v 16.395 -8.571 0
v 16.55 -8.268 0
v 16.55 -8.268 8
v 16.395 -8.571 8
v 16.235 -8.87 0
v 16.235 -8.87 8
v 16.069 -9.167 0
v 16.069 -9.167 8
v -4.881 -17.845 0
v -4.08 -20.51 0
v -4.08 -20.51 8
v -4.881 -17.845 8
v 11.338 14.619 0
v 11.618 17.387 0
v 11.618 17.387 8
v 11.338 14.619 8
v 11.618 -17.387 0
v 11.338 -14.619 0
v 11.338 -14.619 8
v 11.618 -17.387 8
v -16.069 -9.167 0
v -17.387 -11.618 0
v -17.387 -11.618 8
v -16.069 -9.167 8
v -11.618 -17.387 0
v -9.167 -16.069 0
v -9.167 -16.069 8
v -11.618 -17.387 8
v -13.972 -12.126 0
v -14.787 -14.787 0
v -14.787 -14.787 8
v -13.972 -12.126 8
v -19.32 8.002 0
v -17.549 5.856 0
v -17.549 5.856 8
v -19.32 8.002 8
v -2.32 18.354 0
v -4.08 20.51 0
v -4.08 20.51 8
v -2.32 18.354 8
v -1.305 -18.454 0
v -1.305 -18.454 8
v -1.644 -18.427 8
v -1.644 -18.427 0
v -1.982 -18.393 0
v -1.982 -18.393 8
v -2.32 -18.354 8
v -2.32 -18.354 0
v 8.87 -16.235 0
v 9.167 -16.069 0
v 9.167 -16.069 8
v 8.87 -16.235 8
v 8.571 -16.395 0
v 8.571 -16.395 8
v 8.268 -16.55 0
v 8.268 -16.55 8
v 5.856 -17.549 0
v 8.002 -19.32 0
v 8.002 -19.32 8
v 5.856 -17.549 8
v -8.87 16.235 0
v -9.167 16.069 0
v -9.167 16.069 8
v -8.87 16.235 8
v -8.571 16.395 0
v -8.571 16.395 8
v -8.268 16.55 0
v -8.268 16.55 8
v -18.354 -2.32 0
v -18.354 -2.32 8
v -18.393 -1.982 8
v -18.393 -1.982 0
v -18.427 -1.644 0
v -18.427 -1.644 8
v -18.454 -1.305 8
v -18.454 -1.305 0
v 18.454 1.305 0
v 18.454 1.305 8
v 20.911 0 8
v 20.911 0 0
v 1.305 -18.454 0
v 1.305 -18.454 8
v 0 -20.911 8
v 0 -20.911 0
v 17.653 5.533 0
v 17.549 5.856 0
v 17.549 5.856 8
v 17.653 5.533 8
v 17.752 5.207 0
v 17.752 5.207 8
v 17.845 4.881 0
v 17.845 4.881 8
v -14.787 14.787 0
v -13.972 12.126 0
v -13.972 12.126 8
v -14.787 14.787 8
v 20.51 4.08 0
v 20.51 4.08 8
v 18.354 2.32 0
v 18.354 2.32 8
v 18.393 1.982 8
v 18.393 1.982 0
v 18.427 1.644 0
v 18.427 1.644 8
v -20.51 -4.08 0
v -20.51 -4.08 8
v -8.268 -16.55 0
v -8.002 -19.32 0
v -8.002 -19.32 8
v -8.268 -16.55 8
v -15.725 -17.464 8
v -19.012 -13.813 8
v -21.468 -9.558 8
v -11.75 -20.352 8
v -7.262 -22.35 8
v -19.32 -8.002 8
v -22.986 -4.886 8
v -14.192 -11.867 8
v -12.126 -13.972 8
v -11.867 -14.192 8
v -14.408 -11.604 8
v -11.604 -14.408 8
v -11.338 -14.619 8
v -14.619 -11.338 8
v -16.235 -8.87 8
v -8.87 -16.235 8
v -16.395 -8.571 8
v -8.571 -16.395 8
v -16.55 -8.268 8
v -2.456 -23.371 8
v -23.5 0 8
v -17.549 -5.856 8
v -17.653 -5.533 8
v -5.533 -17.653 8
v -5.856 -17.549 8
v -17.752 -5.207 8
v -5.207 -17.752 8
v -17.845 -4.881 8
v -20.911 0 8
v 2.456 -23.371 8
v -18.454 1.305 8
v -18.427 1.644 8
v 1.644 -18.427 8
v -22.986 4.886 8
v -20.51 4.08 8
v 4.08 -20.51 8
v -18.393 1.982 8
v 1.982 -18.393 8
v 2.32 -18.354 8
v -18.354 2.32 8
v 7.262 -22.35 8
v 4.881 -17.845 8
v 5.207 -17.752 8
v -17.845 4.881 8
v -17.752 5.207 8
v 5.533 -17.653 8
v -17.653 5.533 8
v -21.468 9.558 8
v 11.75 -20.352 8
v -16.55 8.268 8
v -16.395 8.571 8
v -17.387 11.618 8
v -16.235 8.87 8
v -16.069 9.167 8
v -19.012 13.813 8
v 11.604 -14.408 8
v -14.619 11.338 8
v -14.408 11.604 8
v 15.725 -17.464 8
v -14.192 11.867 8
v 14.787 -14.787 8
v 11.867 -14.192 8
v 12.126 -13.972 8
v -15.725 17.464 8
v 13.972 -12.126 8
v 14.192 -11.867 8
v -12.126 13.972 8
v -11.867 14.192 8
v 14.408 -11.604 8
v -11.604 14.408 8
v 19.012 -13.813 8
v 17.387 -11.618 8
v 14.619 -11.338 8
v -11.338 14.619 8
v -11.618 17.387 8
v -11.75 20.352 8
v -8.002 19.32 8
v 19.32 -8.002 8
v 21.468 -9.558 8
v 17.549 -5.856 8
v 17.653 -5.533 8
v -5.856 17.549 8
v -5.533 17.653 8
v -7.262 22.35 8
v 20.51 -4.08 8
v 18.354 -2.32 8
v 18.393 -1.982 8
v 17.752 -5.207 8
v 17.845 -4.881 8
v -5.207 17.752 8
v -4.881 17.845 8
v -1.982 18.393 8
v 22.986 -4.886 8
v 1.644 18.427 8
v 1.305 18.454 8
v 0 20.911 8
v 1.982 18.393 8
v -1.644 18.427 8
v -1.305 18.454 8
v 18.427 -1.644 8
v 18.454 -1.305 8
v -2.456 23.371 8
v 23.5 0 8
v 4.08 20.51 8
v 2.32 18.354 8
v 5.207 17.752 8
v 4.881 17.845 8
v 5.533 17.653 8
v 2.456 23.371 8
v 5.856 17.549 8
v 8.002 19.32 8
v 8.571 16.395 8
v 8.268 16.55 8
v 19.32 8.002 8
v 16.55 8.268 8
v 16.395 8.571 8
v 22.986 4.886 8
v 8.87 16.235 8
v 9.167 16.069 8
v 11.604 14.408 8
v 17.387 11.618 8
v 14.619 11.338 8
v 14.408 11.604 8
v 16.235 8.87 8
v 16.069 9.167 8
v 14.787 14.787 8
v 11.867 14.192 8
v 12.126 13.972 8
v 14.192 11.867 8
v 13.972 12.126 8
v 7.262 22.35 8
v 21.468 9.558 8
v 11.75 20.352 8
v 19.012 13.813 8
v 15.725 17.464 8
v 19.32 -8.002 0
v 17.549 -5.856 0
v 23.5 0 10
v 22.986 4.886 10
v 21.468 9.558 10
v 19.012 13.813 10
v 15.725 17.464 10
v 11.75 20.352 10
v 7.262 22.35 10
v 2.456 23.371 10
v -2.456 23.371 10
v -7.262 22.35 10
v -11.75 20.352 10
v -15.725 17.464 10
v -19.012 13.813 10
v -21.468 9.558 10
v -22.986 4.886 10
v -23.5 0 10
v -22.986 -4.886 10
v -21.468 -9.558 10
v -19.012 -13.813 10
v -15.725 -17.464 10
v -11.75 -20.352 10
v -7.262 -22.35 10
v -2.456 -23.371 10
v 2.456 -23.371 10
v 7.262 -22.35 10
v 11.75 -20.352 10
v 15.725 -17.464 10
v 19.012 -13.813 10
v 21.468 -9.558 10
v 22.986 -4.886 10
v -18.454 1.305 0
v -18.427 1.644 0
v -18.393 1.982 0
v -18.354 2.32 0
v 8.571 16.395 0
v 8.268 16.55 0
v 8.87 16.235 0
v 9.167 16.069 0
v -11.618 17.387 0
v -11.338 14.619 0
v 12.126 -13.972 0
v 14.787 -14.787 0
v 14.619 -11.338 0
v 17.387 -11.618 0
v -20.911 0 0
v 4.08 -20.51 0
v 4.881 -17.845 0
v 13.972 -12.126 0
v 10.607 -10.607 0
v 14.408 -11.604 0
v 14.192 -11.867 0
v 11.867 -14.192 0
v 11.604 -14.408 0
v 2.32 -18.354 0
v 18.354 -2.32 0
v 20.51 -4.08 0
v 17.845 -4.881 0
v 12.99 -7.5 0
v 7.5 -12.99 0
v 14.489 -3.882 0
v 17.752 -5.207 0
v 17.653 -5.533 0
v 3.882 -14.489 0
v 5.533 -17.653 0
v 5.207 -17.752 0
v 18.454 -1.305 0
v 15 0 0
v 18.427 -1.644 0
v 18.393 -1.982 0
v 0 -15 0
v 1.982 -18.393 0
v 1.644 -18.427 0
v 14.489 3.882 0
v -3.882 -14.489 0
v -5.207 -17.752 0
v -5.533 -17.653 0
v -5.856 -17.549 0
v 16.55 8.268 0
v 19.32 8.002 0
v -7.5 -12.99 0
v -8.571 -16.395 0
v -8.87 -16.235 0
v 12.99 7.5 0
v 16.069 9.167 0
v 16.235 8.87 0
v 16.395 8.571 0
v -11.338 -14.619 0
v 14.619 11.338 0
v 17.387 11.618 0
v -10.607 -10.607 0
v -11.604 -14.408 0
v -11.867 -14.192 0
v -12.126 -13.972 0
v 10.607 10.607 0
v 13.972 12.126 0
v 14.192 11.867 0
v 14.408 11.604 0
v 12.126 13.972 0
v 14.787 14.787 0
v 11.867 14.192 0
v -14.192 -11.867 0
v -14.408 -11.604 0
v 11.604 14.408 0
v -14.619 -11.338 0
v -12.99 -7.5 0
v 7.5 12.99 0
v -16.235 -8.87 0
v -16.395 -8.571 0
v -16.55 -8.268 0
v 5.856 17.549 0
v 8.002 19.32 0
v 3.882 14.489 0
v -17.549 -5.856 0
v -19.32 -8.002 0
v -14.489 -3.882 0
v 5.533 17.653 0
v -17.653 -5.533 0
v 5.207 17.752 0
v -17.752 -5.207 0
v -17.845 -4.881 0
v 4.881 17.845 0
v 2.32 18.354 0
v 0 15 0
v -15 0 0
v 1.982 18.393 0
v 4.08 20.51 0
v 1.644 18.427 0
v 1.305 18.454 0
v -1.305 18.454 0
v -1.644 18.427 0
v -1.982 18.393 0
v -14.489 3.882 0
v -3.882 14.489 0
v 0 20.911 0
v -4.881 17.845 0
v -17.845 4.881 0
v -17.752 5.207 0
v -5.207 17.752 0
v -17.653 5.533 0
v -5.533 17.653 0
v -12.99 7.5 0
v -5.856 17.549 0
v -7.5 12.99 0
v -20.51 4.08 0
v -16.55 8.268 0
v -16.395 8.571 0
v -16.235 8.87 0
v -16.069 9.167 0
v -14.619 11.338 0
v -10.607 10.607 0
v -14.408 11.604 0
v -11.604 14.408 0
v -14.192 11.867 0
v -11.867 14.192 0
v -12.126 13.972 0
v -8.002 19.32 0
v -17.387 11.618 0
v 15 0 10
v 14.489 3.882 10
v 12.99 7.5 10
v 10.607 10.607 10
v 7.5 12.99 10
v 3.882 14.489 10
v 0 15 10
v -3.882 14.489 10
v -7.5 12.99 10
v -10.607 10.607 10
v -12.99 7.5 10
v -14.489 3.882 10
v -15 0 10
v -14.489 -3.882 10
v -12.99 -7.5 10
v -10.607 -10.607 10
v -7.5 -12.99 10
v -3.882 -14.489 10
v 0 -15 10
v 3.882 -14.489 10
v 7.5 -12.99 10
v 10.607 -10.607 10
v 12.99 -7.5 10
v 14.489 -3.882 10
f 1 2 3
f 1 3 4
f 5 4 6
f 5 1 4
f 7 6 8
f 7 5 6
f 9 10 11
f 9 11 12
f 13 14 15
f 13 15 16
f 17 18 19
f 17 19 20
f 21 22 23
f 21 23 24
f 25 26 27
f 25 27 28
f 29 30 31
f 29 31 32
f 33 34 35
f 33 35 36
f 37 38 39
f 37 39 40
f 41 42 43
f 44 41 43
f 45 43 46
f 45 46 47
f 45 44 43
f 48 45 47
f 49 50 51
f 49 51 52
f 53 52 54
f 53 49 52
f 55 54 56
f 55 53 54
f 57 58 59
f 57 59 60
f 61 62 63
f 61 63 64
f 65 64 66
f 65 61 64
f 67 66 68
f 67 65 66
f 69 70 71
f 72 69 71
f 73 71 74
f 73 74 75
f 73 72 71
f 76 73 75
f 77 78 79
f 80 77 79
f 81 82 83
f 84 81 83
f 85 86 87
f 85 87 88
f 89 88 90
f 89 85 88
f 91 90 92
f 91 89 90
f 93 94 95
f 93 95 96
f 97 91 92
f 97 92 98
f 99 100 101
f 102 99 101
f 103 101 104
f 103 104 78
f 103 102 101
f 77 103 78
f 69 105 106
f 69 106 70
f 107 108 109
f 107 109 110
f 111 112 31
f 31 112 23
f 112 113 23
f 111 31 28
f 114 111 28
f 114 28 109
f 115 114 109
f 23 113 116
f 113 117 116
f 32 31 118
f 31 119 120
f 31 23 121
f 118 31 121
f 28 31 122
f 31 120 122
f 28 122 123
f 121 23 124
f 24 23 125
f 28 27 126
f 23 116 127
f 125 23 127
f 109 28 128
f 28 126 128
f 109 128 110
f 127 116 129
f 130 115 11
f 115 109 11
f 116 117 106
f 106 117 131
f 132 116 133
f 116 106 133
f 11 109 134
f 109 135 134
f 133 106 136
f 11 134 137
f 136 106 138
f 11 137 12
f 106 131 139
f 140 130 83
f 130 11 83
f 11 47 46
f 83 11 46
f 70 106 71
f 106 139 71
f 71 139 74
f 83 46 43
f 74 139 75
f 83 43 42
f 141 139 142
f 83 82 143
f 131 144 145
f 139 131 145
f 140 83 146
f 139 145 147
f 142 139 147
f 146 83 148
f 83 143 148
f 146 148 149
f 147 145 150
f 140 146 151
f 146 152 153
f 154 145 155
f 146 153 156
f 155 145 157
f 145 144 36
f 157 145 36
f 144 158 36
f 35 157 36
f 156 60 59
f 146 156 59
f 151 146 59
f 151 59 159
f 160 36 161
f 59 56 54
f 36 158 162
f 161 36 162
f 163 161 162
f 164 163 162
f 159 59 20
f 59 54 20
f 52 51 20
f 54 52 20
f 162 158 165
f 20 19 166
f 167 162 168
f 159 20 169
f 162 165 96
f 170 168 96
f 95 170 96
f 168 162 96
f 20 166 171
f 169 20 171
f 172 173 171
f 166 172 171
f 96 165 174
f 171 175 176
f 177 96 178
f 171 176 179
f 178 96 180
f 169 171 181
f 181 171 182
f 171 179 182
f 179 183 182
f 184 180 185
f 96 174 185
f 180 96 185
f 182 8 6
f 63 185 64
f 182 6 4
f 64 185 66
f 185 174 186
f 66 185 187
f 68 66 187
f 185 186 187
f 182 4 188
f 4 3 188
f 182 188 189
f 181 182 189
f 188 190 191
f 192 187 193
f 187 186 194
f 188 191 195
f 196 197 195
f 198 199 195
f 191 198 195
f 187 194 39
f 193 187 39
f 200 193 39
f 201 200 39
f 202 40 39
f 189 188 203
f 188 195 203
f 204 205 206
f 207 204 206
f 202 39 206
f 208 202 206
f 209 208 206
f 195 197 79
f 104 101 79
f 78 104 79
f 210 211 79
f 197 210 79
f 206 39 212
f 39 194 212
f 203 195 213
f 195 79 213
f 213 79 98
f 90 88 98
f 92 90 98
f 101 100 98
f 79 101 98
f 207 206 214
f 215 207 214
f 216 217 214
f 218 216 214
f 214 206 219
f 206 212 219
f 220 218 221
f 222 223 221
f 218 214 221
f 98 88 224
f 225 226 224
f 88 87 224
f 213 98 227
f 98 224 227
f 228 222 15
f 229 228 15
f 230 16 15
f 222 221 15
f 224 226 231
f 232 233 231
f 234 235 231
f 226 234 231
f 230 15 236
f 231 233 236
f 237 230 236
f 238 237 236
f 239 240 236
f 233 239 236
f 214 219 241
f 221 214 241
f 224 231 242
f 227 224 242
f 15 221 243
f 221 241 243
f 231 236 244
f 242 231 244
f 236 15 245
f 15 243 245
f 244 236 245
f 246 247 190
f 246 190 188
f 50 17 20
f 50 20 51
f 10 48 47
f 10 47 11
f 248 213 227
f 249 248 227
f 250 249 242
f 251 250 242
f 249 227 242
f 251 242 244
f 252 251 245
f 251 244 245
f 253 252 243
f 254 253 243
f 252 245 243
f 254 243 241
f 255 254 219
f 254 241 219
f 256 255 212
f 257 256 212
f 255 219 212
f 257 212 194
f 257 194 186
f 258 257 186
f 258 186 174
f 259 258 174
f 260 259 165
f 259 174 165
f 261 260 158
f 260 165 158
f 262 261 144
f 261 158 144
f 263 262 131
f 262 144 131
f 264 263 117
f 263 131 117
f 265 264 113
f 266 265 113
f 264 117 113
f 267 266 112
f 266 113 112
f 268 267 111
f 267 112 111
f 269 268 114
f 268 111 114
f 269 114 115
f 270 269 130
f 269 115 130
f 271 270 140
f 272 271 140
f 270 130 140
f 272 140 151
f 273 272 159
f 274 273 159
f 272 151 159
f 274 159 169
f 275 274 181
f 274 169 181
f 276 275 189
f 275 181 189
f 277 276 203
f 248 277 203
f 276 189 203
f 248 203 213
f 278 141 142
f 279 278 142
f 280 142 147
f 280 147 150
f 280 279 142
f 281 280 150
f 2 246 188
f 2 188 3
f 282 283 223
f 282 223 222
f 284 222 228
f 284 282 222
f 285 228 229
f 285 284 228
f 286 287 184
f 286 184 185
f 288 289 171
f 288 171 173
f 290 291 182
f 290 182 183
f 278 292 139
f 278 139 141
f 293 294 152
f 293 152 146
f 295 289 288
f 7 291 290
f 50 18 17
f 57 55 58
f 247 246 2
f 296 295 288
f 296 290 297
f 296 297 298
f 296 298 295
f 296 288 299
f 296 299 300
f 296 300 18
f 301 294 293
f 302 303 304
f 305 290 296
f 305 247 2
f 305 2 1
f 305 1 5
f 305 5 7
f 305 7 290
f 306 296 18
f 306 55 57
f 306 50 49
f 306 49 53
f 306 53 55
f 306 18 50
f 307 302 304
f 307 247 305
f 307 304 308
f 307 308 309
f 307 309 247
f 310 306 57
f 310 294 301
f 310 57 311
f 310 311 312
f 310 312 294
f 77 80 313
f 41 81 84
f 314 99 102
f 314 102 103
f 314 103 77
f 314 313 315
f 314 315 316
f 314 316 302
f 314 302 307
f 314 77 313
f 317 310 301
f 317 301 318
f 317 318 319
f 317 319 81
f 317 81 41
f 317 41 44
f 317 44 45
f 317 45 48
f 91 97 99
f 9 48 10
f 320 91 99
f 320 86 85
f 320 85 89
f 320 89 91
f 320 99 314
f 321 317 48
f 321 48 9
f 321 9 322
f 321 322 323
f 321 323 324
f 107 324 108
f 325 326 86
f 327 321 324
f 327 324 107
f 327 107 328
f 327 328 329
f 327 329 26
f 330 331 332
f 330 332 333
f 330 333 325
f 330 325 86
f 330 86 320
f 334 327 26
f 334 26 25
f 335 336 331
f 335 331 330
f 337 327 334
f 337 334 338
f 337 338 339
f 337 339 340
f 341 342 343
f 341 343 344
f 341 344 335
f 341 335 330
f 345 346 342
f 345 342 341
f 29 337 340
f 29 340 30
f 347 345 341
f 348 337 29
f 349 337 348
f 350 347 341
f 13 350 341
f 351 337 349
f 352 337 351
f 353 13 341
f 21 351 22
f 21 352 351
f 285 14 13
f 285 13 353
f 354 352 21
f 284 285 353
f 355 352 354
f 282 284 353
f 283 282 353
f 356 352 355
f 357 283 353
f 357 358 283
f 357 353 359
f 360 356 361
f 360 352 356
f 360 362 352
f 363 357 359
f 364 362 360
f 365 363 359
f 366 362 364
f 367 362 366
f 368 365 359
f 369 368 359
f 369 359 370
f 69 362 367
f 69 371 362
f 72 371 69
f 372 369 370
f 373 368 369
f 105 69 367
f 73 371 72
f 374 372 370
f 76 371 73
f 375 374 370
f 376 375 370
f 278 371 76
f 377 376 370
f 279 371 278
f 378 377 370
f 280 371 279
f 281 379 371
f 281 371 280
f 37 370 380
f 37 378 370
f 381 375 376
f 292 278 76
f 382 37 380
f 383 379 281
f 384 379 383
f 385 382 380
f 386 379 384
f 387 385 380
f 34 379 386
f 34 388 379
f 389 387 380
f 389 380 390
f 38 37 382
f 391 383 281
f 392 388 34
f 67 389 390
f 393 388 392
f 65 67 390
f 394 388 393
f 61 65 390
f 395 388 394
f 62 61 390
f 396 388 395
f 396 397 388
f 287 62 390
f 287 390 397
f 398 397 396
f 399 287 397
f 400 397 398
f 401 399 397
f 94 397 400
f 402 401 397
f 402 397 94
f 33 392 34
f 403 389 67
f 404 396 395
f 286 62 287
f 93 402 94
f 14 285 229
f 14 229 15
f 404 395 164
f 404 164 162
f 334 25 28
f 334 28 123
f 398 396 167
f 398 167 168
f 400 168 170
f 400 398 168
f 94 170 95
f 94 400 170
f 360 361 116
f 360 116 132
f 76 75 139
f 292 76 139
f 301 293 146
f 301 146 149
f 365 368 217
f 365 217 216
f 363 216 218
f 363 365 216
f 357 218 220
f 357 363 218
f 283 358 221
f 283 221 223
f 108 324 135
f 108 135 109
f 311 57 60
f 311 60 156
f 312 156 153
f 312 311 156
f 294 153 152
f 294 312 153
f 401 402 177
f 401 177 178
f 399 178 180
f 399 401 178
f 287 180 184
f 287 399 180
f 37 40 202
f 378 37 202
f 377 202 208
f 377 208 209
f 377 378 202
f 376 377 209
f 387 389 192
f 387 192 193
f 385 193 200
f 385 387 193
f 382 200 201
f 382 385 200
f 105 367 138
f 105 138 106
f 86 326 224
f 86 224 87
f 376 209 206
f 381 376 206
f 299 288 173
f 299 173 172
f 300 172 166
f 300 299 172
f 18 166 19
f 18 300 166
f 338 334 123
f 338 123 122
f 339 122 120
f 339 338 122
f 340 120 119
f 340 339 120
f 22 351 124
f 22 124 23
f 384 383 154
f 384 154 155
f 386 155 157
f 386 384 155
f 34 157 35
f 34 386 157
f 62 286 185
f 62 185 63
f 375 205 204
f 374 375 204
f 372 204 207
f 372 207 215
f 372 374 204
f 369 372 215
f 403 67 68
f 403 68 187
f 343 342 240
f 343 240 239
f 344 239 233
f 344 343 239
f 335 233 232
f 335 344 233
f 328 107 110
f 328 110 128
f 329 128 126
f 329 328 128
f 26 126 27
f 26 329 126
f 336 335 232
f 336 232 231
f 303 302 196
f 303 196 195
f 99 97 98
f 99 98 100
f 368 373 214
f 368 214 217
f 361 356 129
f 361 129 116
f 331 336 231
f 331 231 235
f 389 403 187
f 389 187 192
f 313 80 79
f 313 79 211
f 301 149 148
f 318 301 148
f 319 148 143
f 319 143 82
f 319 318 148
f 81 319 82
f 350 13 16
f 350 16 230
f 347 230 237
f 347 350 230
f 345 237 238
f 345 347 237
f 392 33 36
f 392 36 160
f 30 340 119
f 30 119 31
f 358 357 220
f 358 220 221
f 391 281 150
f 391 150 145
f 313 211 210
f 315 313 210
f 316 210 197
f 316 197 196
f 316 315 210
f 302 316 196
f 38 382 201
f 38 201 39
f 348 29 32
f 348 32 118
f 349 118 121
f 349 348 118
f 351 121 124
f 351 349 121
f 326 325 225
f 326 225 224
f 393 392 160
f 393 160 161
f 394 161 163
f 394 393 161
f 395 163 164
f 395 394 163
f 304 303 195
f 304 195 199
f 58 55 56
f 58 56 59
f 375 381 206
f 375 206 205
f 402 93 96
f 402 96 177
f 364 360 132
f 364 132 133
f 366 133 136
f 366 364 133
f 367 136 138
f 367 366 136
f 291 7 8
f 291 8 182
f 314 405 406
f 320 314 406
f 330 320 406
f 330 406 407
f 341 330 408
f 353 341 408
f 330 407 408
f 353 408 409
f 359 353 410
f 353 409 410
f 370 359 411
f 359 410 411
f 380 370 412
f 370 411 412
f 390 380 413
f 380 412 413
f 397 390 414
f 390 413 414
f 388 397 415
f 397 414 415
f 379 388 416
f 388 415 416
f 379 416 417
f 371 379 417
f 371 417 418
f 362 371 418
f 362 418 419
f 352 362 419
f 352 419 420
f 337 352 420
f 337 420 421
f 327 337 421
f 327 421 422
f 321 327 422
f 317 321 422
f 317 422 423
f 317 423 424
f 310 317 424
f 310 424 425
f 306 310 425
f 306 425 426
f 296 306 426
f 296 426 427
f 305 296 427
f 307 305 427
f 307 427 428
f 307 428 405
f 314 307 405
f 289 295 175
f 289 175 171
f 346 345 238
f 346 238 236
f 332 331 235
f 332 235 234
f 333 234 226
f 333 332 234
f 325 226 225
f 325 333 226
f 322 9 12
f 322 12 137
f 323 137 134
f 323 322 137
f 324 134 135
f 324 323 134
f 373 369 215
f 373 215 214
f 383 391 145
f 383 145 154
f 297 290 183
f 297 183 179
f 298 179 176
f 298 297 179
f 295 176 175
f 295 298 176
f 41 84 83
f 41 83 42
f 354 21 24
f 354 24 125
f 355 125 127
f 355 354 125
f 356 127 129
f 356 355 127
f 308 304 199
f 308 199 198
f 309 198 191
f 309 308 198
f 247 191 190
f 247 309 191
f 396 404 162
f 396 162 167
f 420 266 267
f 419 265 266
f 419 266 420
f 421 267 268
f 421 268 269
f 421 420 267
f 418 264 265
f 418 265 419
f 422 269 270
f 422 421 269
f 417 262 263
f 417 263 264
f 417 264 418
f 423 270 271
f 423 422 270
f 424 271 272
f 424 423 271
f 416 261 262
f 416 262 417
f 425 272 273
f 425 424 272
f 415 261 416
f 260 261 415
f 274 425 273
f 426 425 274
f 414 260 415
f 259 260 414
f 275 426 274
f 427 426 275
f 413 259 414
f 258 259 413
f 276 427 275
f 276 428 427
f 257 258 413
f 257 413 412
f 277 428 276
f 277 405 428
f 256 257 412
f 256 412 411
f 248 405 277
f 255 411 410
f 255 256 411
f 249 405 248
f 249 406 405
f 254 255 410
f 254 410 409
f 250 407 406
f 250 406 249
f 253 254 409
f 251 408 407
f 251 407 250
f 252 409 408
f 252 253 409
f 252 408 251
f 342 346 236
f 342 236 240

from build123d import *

# Parameters (mm, degrees)
BOSS_EXTRUDE1_DEPTH = 8
SKETCH3_R           = 23.5
BOSS_EXTRUDE2_DEPTH = 2
SKETCH5_R           = 15
CUT_EXTRUDE2_DEPTH  = 12


with BuildPart() as part:
    # Sketch1 → Boss-Extrude1 (new body)
    with BuildSketch(Plane.XY):
        with BuildLine():
            Line((0, 20.911393532), (1.305419533, 18.453885223))
            ThreePointArc((1.305419533, 18.453885223), (1.813317096, 18.410917443), (2.319838147, 18.353973711))
            Line((2.319838147, 18.353973711), (4.079610498, 20.509586969))
            Line((4.079610498, 20.509586969), (4.880510674, 17.844624276))
            ThreePointArc((4.880510674, 17.844624276), (5.370266529, 17.703396211), (5.855945749, 17.548729281))
            Line((5.855945749, 17.548729281), (8.002443852, 19.319608481))
            Line((8.002443852, 19.319608481), (8.268046526, 16.549604426))
            ThreePointArc((8.268046526, 16.549604426), (8.720839631, 16.31554339), (9.16701264, 16.069097027))
            Line((9.16701264, 16.069097027), (11.617747778, 17.387188273))
            Line((11.617747778, 17.387188273), (11.337845987, 14.618592558))
            ThreePointArc((11.337845987, 14.618592558), (11.736275757, 14.300693387), (12.125796376, 13.971938385))
            Line((12.125796376, 13.971938385), (14.786588171, 14.786588171))
            Line((14.786588171, 14.786588171), (13.971938385, 12.125796376))
            ThreePointArc((13.971938385, 12.125796376), (14.300693387, 11.736275757), (14.618592558, 11.337845987))
            Line((14.618592558, 11.337845987), (17.387188273, 11.617747778))
            Line((17.387188273, 11.617747778), (16.069097027, 9.16701264))
            ThreePointArc((16.069097027, 9.16701264), (16.31554339, 8.720839631), (16.549604426, 8.268046526))
            Line((16.549604426, 8.268046526), (19.319608481, 8.002443852))
            Line((19.319608481, 8.002443852), (17.548729281, 5.855945749))
            ThreePointArc((17.548729281, 5.855945749), (17.703396211, 5.370266529), (17.844624276, 4.880510674))
            Line((17.844624276, 4.880510674), (20.509586969, 4.079610498))
            Line((20.509586969, 4.079610498), (18.353973711, 2.319838147))
            ThreePointArc((18.353973711, 2.319838147), (18.410917443, 1.813317096), (18.453885223, 1.305419533))
            Line((18.453885223, 1.305419533), (20.911393532, 0))
            Line((20.911393532, 0), (18.453885223, -1.305419533))
            ThreePointArc((18.453885223, -1.305419533), (18.410917443, -1.813317096), (18.353973711, -2.319838147))
            Line((18.353973711, -2.319838147), (20.509586969, -4.079610498))
            Line((20.509586969, -4.079610498), (17.844624276, -4.880510674))
            ThreePointArc((17.844624276, -4.880510674), (17.703396211, -5.370266529), (17.548729281, -5.855945749))
            Line((17.548729281, -5.855945749), (19.319608481, -8.002443852))
            Line((19.319608481, -8.002443852), (16.549604426, -8.268046526))
            ThreePointArc((16.549604426, -8.268046526), (16.31554339, -8.720839631), (16.069097027, -9.16701264))
            Line((16.069097027, -9.16701264), (17.387188273, -11.617747778))
            Line((17.387188273, -11.617747778), (14.618592558, -11.337845987))
            ThreePointArc((14.618592558, -11.337845987), (14.300693387, -11.736275757), (13.971938385, -12.125796376))
            Line((13.971938385, -12.125796376), (14.786588171, -14.786588171))
            Line((14.786588171, -14.786588171), (12.125796376, -13.971938385))
            ThreePointArc((12.125796376, -13.971938385), (11.736275757, -14.300693387), (11.337845987, -14.618592558))
            Line((11.337845987, -14.618592558), (11.617747778, -17.387188273))
            Line((11.617747778, -17.387188273), (9.16701264, -16.069097027))
            ThreePointArc((9.16701264, -16.069097027), (8.720839631, -16.31554339), (8.268046526, -16.549604426))
            Line((8.268046526, -16.549604426), (8.002443852, -19.319608481))
            Line((8.002443852, -19.319608481), (5.855945749, -17.548729281))
            ThreePointArc((5.855945749, -17.548729281), (5.370266529, -17.703396211), (4.880510674, -17.844624276))
            Line((4.880510674, -17.844624276), (4.079610498, -20.509586969))
            Line((4.079610498, -20.509586969), (2.319838147, -18.353973711))
            ThreePointArc((2.319838147, -18.353973711), (1.813317096, -18.410917443), (1.305419533, -18.453885223))
            Line((1.305419533, -18.453885223), (0, -20.911393532))
            Line((0, -20.911393532), (-1.305419533, -18.453885223))
            ThreePointArc((-1.305419533, -18.453885223), (-1.813317096, -18.410917443), (-2.319838147, -18.353973711))
            Line((-2.319838147, -18.353973711), (-4.079610498, -20.509586969))
            Line((-4.079610498, -20.509586969), (-4.880510674, -17.844624276))
            ThreePointArc((-4.880510674, -17.844624276), (-5.370266529, -17.703396211), (-5.855945749, -17.548729281))
            Line((-5.855945749, -17.548729281), (-8.002443852, -19.319608481))
            Line((-8.002443852, -19.319608481), (-8.268046526, -16.549604426))
            ThreePointArc((-8.268046526, -16.549604426), (-8.720839631, -16.31554339), (-9.16701264, -16.069097027))
            Line((-9.16701264, -16.069097027), (-11.617747778, -17.387188273))
            Line((-11.617747778, -17.387188273), (-11.337845987, -14.618592558))
            ThreePointArc((-11.337845987, -14.618592558), (-11.736275757, -14.300693387), (-12.125796376, -13.971938385))
            Line((-12.125796376, -13.971938385), (-14.786588171, -14.786588171))
            Line((-14.786588171, -14.786588171), (-13.971938385, -12.125796376))
            ThreePointArc((-13.971938385, -12.125796376), (-14.300693387, -11.736275757), (-14.618592558, -11.337845987))
            Line((-14.618592558, -11.337845987), (-17.387188273, -11.617747778))
            Line((-17.387188273, -11.617747778), (-16.069097027, -9.16701264))
            ThreePointArc((-16.069097027, -9.16701264), (-16.31554339, -8.720839631), (-16.549604426, -8.268046526))
            Line((-16.549604426, -8.268046526), (-19.319608481, -8.002443852))
            Line((-19.319608481, -8.002443852), (-17.548729281, -5.855945749))
            ThreePointArc((-17.548729281, -5.855945749), (-17.703396211, -5.370266529), (-17.844624276, -4.880510674))
            Line((-17.844624276, -4.880510674), (-20.509586969, -4.079610498))
            Line((-20.509586969, -4.079610498), (-18.353973711, -2.319838147))
            ThreePointArc((-18.353973711, -2.319838147), (-18.410917443, -1.813317096), (-18.453885223, -1.305419533))
            Line((-18.453885223, -1.305419533), (-20.911393532, 0))
            Line((-20.911393532, 0), (-18.453885223, 1.305419533))
            ThreePointArc((-18.453885223, 1.305419533), (-18.410917443, 1.813317096), (-18.353973711, 2.319838147))
            Line((-18.353973711, 2.319838147), (-20.509586969, 4.079610498))
            Line((-20.509586969, 4.079610498), (-17.844624276, 4.880510674))
            ThreePointArc((-17.844624276, 4.880510674), (-17.703396211, 5.370266529), (-17.548729281, 5.855945749))
            Line((-17.548729281, 5.855945749), (-19.319608481, 8.002443852))
            Line((-19.319608481, 8.002443852), (-16.549604426, 8.268046526))
            ThreePointArc((-16.549604426, 8.268046526), (-16.31554339, 8.720839631), (-16.069097027, 9.16701264))
            Line((-16.069097027, 9.16701264), (-17.387188273, 11.617747778))
            Line((-17.387188273, 11.617747778), (-14.618592558, 11.337845987))
            ThreePointArc((-14.618592558, 11.337845987), (-14.300693387, 11.736275757), (-13.971938385, 12.125796376))
            Line((-13.971938385, 12.125796376), (-14.786588171, 14.786588171))
            Line((-14.786588171, 14.786588171), (-12.125796376, 13.971938385))
            ThreePointArc((-12.125796376, 13.971938385), (-11.736275757, 14.300693387), (-11.337845987, 14.618592558))
            Line((-11.337845987, 14.618592558), (-11.617747778, 17.387188273))
            Line((-11.617747778, 17.387188273), (-9.16701264, 16.069097027))
            ThreePointArc((-9.16701264, 16.069097027), (-8.720839631, 16.31554339), (-8.268046526, 16.549604426))
            Line((-8.268046526, 16.549604426), (-8.002443852, 19.319608481))
            Line((-8.002443852, 19.319608481), (-5.855945749, 17.548729281))
            ThreePointArc((-5.855945749, 17.548729281), (-5.370266529, 17.703396211), (-4.880510674, 17.844624276))
            Line((-4.880510674, 17.844624276), (-4.079610498, 20.509586969))
            Line((-4.079610498, 20.509586969), (-2.319838147, 18.353973711))
            ThreePointArc((-2.319838147, 18.353973711), (-1.813317096, 18.410917443), (-1.305419533, 18.453885223))
            Line((-1.305419533, 18.453885223), (0, 20.911393532))
        make_face()
    extrude(amount=BOSS_EXTRUDE1_DEPTH)

    # Sketch3 → Boss-Extrude2 (add)
    with BuildSketch(Plane.XY.offset(8)):
        Circle(SKETCH3_R)
    extrude(amount=BOSS_EXTRUDE2_DEPTH)

    # Sketch5 → Cut-Extrude2 (cut)
    with BuildSketch(Plane.XY.offset(10)):
        Circle(SKETCH5_R)
    extrude(amount=-CUT_EXTRUDE2_DEPTH, mode=Mode.SUBTRACT)


solid = part.part
